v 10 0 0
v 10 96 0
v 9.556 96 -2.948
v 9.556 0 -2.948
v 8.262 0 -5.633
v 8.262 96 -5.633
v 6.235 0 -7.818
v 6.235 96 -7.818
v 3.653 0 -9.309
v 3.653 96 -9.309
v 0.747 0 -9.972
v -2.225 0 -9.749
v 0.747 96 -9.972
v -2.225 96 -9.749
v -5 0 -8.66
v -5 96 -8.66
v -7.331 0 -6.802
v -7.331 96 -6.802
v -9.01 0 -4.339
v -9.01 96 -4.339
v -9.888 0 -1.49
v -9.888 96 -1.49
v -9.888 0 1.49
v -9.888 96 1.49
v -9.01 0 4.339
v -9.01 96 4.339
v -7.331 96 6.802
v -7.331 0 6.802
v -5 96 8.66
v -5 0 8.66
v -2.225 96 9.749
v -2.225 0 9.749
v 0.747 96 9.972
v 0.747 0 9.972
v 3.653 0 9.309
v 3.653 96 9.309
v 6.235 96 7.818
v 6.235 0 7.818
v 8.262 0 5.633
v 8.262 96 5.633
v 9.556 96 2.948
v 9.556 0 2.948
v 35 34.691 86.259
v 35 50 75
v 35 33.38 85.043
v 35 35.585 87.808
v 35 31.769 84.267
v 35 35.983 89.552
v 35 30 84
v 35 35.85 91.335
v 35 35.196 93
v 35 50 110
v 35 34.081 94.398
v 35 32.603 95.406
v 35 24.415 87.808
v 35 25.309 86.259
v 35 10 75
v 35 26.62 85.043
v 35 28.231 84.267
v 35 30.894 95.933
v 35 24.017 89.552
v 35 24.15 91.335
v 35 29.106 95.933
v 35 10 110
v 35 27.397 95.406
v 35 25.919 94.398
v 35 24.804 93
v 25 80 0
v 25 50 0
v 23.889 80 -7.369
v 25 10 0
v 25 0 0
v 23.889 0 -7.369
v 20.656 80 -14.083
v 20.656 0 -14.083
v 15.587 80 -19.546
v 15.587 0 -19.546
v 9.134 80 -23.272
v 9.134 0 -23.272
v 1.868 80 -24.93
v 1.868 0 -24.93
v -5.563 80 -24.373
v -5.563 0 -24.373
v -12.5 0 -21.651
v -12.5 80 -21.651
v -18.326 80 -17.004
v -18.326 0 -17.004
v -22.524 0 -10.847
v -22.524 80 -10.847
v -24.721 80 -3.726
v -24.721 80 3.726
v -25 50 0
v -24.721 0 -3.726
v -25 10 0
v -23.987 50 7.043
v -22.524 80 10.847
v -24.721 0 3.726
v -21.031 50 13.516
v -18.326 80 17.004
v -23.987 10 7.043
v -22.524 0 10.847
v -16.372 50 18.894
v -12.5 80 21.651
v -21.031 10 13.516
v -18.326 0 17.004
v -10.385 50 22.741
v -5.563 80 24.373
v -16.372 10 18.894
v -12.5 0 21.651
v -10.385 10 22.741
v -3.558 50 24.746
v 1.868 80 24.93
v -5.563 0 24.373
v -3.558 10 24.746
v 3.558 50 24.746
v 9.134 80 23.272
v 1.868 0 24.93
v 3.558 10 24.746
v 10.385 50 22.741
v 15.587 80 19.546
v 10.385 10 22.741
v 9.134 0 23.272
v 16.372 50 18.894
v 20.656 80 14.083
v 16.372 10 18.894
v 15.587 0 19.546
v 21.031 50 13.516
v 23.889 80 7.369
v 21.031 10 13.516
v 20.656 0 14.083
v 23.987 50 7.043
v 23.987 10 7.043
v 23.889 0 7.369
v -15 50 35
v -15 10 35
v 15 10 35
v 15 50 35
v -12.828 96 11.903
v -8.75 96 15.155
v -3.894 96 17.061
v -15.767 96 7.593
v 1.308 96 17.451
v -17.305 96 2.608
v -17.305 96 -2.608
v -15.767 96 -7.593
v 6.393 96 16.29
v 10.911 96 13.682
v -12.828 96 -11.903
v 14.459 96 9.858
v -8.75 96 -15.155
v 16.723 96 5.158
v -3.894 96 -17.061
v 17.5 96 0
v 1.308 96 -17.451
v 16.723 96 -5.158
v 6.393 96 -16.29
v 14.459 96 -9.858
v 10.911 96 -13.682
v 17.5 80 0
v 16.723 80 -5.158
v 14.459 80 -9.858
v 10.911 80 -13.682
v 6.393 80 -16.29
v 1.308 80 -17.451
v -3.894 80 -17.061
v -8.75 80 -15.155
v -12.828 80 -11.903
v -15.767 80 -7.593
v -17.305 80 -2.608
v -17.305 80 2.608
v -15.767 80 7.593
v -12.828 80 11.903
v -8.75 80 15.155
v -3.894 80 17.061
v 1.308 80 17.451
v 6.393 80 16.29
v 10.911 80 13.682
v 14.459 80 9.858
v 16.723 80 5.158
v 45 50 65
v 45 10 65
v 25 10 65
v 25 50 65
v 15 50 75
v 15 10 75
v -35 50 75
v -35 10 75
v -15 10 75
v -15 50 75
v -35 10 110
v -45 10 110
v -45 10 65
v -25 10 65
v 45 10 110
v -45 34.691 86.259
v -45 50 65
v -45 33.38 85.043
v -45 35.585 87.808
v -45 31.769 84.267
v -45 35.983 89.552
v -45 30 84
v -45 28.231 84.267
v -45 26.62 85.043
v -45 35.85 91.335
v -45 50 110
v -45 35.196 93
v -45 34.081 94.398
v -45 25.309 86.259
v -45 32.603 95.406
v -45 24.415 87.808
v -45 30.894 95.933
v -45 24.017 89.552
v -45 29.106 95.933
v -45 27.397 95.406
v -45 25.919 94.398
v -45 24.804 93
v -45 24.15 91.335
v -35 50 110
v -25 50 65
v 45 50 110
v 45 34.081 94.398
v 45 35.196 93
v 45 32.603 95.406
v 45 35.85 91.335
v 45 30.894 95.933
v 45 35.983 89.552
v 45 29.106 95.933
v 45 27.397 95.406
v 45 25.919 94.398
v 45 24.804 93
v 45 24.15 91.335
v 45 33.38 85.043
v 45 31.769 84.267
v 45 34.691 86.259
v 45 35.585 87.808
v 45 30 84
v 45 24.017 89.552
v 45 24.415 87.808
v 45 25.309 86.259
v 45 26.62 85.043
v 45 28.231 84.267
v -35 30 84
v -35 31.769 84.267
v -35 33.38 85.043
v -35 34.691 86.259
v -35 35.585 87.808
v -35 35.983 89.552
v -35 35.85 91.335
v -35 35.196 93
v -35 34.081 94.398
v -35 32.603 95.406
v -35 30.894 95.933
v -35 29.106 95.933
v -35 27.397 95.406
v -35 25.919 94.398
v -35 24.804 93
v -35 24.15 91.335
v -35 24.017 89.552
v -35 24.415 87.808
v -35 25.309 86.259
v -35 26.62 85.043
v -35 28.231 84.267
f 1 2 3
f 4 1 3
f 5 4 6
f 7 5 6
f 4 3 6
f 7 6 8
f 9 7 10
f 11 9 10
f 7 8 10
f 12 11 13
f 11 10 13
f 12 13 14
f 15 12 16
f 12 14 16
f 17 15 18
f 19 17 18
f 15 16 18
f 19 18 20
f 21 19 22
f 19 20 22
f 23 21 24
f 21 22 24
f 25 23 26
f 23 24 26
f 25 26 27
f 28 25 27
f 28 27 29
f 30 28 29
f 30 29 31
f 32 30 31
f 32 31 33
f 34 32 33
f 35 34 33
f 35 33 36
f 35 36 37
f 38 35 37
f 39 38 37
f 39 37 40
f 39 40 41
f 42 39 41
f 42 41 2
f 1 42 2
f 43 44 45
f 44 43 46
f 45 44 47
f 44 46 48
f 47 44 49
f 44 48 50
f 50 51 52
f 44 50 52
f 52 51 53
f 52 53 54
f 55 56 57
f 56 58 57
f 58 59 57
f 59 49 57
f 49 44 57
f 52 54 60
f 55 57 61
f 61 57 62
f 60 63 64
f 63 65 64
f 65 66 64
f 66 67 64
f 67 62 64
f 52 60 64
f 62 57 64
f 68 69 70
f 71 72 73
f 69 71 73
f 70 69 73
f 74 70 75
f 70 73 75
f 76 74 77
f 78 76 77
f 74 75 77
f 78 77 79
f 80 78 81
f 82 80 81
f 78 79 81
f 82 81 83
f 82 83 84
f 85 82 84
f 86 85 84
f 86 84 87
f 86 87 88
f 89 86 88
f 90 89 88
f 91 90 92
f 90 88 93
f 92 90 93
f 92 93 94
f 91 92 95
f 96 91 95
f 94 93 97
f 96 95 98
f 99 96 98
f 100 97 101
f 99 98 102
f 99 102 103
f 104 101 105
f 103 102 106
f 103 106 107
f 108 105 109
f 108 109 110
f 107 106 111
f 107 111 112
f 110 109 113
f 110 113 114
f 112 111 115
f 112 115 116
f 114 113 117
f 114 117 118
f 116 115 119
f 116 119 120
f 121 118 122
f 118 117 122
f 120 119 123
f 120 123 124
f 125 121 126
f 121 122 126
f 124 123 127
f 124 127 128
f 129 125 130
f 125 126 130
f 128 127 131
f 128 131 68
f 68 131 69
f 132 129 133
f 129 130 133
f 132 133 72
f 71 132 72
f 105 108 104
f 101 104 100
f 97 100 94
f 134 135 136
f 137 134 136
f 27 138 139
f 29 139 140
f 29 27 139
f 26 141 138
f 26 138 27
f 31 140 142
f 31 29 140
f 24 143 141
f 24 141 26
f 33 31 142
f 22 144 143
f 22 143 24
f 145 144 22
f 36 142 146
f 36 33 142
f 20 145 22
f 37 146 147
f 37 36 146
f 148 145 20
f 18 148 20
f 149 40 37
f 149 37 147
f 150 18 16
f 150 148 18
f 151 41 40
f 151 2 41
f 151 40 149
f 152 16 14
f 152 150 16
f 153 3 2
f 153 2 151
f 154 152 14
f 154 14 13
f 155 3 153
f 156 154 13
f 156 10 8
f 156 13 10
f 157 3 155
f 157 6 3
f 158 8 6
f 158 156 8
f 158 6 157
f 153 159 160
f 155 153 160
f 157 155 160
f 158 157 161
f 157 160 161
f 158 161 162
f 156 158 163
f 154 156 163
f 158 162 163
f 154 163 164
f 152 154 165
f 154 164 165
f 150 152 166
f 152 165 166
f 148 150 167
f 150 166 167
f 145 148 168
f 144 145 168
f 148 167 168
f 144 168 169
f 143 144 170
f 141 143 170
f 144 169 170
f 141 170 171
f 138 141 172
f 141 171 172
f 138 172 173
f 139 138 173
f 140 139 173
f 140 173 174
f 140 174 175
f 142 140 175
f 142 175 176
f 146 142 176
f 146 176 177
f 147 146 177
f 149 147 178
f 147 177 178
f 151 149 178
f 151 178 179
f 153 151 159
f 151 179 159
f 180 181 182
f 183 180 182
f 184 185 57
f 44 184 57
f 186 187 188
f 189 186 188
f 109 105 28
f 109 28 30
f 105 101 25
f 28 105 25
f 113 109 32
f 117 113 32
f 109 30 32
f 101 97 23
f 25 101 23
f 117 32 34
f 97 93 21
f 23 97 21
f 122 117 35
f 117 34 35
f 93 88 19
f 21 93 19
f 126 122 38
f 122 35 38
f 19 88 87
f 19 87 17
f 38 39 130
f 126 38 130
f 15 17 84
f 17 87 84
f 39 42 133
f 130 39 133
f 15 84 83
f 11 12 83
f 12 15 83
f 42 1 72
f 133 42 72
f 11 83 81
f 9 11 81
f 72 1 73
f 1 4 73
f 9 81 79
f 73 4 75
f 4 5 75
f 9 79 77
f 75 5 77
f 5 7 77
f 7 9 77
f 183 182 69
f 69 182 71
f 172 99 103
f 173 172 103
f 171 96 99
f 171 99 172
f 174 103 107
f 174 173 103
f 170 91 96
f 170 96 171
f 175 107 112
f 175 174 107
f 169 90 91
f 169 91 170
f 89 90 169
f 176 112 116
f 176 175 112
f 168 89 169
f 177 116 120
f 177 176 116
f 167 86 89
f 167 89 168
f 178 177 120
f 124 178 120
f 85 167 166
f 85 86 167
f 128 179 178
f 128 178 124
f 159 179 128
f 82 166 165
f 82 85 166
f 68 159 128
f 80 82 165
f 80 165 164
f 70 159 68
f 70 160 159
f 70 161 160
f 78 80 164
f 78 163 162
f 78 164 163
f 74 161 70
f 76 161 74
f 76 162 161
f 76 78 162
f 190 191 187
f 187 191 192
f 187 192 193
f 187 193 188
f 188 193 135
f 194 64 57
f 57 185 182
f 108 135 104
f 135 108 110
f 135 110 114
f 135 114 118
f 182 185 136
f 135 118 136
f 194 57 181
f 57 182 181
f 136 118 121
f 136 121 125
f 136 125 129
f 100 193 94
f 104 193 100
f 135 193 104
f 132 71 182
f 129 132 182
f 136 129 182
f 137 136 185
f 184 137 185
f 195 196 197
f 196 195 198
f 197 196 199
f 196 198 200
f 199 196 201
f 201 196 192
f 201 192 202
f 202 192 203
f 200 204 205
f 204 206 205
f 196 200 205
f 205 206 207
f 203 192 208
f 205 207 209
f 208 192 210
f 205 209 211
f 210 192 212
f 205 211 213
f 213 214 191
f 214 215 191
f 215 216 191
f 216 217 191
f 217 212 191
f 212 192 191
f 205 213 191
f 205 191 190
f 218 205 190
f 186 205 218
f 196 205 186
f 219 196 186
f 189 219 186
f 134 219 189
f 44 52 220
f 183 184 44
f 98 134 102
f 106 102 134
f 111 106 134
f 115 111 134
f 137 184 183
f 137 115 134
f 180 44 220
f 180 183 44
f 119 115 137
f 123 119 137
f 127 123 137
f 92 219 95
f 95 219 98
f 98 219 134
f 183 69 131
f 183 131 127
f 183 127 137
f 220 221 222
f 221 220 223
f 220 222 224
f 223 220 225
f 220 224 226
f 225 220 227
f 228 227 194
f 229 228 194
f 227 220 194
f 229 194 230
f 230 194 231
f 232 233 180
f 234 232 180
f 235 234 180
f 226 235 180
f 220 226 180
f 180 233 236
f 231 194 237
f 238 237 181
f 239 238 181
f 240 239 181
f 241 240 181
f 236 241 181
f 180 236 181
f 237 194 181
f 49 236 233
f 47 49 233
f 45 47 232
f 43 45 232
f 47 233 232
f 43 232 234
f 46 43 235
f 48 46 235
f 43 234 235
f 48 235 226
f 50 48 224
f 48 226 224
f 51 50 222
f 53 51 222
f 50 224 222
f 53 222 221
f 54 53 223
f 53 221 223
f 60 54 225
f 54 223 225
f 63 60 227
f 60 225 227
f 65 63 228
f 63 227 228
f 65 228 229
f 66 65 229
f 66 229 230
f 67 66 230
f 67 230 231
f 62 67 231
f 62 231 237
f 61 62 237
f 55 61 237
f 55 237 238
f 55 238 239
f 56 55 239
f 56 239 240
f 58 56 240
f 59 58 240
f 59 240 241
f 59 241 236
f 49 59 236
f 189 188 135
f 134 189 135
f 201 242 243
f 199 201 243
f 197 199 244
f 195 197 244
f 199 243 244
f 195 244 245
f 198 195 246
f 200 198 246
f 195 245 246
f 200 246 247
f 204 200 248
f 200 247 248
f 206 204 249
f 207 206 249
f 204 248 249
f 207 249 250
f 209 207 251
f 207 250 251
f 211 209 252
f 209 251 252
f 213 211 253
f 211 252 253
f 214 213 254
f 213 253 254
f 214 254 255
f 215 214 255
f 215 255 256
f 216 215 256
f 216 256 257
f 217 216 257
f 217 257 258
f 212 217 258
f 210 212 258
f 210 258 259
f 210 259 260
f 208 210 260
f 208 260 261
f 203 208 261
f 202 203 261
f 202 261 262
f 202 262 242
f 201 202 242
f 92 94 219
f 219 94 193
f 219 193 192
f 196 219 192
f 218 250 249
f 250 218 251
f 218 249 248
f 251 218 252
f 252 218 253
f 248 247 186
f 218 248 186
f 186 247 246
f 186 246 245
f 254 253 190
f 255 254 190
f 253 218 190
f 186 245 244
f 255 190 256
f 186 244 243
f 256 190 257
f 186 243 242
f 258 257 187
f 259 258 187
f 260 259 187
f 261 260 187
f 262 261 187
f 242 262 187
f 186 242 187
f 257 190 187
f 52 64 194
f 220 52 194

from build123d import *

# Parameters (mm, degrees)
SKETCH1_R           = 25
BOSS_EXTRUDE1_DEPTH = 80
SKETCH2_R           = 17.5
BOSS_EXTRUDE2_DEPTH = 16
SKETCH3_R           = 10
CUT_EXTRUDE1_DEPTH  = 200
BOSS_EXTRUDE3_START = 10
BOSS_EXTRUDE3_DEPTH = 40
SKETCH5_R           = 6
CUT_EXTRUDE2_DEPTH  = 100


with BuildPart() as part:
    # Sketch1 → Boss-Extrude1 (new body)
    with BuildSketch(Plane(origin=(0, 0, 0), x_dir=(1, 0, 0), z_dir=(0, 1, 0))):
        Circle(SKETCH1_R)
    extrude(amount=BOSS_EXTRUDE1_DEPTH)

    # Sketch2 → Boss-Extrude2 (add)
    with BuildSketch(Plane(origin=(0, 80, 0), x_dir=(1, 0, 0), z_dir=(0, 1, 0))):
        Circle(SKETCH2_R)
    extrude(amount=BOSS_EXTRUDE2_DEPTH)

    # Sketch3 → Cut-Extrude1 (cut)
    with BuildSketch(Plane(origin=(0, 96, 0), x_dir=(1, 0, 0), z_dir=(0, 1, 0))):
        Circle(SKETCH3_R)
    extrude(amount=-CUT_EXTRUDE1_DEPTH, mode=Mode.SUBTRACT)

    # Sketch4 → Boss-Extrude3 (add)
    with BuildSketch(Plane(origin=(0, 0, 0), x_dir=(1, 0, 0), z_dir=(0, 1, 0)).offset(BOSS_EXTRUDE3_START)):
        with BuildLine():
            Line((-25, 0), (-25, -65))
            Line((-25, -65), (-45, -65))
            Line((-45, -65), (-45, -110))
            Line((-45, -110), (-35, -110))
            Line((-35, -110), (-35, -75))
            Line((-35, -75), (-15, -75))
            Line((-15, -75), (-15, -35))
            Line((-15, -35), (0, -35))
            Line((0, -35), (15, -35))
            Line((15, -35), (15, -75))
            Line((15, -75), (35, -75))
            Line((35, -75), (35, -110))
            Line((35, -110), (45, -110))
            Line((45, -110), (45, -65))
            Line((45, -65), (25, -65))
            Line((25, -65), (25, 0))
            ThreePointArc((25, 0), (0, -25), (-25, 0))
        make_face()
    extrude(amount=BOSS_EXTRUDE3_DEPTH)

    # Sketch5 → Cut-Extrude2 (cut)
    with BuildSketch(Plane(origin=(45, 0, 0), x_dir=(0, 0, -1), z_dir=(1, 0, 0))):
        with Locations((-90, 30)):
            Circle(SKETCH5_R)
    extrude(amount=-CUT_EXTRUDE2_DEPTH, mode=Mode.SUBTRACT)


solid = part.part
